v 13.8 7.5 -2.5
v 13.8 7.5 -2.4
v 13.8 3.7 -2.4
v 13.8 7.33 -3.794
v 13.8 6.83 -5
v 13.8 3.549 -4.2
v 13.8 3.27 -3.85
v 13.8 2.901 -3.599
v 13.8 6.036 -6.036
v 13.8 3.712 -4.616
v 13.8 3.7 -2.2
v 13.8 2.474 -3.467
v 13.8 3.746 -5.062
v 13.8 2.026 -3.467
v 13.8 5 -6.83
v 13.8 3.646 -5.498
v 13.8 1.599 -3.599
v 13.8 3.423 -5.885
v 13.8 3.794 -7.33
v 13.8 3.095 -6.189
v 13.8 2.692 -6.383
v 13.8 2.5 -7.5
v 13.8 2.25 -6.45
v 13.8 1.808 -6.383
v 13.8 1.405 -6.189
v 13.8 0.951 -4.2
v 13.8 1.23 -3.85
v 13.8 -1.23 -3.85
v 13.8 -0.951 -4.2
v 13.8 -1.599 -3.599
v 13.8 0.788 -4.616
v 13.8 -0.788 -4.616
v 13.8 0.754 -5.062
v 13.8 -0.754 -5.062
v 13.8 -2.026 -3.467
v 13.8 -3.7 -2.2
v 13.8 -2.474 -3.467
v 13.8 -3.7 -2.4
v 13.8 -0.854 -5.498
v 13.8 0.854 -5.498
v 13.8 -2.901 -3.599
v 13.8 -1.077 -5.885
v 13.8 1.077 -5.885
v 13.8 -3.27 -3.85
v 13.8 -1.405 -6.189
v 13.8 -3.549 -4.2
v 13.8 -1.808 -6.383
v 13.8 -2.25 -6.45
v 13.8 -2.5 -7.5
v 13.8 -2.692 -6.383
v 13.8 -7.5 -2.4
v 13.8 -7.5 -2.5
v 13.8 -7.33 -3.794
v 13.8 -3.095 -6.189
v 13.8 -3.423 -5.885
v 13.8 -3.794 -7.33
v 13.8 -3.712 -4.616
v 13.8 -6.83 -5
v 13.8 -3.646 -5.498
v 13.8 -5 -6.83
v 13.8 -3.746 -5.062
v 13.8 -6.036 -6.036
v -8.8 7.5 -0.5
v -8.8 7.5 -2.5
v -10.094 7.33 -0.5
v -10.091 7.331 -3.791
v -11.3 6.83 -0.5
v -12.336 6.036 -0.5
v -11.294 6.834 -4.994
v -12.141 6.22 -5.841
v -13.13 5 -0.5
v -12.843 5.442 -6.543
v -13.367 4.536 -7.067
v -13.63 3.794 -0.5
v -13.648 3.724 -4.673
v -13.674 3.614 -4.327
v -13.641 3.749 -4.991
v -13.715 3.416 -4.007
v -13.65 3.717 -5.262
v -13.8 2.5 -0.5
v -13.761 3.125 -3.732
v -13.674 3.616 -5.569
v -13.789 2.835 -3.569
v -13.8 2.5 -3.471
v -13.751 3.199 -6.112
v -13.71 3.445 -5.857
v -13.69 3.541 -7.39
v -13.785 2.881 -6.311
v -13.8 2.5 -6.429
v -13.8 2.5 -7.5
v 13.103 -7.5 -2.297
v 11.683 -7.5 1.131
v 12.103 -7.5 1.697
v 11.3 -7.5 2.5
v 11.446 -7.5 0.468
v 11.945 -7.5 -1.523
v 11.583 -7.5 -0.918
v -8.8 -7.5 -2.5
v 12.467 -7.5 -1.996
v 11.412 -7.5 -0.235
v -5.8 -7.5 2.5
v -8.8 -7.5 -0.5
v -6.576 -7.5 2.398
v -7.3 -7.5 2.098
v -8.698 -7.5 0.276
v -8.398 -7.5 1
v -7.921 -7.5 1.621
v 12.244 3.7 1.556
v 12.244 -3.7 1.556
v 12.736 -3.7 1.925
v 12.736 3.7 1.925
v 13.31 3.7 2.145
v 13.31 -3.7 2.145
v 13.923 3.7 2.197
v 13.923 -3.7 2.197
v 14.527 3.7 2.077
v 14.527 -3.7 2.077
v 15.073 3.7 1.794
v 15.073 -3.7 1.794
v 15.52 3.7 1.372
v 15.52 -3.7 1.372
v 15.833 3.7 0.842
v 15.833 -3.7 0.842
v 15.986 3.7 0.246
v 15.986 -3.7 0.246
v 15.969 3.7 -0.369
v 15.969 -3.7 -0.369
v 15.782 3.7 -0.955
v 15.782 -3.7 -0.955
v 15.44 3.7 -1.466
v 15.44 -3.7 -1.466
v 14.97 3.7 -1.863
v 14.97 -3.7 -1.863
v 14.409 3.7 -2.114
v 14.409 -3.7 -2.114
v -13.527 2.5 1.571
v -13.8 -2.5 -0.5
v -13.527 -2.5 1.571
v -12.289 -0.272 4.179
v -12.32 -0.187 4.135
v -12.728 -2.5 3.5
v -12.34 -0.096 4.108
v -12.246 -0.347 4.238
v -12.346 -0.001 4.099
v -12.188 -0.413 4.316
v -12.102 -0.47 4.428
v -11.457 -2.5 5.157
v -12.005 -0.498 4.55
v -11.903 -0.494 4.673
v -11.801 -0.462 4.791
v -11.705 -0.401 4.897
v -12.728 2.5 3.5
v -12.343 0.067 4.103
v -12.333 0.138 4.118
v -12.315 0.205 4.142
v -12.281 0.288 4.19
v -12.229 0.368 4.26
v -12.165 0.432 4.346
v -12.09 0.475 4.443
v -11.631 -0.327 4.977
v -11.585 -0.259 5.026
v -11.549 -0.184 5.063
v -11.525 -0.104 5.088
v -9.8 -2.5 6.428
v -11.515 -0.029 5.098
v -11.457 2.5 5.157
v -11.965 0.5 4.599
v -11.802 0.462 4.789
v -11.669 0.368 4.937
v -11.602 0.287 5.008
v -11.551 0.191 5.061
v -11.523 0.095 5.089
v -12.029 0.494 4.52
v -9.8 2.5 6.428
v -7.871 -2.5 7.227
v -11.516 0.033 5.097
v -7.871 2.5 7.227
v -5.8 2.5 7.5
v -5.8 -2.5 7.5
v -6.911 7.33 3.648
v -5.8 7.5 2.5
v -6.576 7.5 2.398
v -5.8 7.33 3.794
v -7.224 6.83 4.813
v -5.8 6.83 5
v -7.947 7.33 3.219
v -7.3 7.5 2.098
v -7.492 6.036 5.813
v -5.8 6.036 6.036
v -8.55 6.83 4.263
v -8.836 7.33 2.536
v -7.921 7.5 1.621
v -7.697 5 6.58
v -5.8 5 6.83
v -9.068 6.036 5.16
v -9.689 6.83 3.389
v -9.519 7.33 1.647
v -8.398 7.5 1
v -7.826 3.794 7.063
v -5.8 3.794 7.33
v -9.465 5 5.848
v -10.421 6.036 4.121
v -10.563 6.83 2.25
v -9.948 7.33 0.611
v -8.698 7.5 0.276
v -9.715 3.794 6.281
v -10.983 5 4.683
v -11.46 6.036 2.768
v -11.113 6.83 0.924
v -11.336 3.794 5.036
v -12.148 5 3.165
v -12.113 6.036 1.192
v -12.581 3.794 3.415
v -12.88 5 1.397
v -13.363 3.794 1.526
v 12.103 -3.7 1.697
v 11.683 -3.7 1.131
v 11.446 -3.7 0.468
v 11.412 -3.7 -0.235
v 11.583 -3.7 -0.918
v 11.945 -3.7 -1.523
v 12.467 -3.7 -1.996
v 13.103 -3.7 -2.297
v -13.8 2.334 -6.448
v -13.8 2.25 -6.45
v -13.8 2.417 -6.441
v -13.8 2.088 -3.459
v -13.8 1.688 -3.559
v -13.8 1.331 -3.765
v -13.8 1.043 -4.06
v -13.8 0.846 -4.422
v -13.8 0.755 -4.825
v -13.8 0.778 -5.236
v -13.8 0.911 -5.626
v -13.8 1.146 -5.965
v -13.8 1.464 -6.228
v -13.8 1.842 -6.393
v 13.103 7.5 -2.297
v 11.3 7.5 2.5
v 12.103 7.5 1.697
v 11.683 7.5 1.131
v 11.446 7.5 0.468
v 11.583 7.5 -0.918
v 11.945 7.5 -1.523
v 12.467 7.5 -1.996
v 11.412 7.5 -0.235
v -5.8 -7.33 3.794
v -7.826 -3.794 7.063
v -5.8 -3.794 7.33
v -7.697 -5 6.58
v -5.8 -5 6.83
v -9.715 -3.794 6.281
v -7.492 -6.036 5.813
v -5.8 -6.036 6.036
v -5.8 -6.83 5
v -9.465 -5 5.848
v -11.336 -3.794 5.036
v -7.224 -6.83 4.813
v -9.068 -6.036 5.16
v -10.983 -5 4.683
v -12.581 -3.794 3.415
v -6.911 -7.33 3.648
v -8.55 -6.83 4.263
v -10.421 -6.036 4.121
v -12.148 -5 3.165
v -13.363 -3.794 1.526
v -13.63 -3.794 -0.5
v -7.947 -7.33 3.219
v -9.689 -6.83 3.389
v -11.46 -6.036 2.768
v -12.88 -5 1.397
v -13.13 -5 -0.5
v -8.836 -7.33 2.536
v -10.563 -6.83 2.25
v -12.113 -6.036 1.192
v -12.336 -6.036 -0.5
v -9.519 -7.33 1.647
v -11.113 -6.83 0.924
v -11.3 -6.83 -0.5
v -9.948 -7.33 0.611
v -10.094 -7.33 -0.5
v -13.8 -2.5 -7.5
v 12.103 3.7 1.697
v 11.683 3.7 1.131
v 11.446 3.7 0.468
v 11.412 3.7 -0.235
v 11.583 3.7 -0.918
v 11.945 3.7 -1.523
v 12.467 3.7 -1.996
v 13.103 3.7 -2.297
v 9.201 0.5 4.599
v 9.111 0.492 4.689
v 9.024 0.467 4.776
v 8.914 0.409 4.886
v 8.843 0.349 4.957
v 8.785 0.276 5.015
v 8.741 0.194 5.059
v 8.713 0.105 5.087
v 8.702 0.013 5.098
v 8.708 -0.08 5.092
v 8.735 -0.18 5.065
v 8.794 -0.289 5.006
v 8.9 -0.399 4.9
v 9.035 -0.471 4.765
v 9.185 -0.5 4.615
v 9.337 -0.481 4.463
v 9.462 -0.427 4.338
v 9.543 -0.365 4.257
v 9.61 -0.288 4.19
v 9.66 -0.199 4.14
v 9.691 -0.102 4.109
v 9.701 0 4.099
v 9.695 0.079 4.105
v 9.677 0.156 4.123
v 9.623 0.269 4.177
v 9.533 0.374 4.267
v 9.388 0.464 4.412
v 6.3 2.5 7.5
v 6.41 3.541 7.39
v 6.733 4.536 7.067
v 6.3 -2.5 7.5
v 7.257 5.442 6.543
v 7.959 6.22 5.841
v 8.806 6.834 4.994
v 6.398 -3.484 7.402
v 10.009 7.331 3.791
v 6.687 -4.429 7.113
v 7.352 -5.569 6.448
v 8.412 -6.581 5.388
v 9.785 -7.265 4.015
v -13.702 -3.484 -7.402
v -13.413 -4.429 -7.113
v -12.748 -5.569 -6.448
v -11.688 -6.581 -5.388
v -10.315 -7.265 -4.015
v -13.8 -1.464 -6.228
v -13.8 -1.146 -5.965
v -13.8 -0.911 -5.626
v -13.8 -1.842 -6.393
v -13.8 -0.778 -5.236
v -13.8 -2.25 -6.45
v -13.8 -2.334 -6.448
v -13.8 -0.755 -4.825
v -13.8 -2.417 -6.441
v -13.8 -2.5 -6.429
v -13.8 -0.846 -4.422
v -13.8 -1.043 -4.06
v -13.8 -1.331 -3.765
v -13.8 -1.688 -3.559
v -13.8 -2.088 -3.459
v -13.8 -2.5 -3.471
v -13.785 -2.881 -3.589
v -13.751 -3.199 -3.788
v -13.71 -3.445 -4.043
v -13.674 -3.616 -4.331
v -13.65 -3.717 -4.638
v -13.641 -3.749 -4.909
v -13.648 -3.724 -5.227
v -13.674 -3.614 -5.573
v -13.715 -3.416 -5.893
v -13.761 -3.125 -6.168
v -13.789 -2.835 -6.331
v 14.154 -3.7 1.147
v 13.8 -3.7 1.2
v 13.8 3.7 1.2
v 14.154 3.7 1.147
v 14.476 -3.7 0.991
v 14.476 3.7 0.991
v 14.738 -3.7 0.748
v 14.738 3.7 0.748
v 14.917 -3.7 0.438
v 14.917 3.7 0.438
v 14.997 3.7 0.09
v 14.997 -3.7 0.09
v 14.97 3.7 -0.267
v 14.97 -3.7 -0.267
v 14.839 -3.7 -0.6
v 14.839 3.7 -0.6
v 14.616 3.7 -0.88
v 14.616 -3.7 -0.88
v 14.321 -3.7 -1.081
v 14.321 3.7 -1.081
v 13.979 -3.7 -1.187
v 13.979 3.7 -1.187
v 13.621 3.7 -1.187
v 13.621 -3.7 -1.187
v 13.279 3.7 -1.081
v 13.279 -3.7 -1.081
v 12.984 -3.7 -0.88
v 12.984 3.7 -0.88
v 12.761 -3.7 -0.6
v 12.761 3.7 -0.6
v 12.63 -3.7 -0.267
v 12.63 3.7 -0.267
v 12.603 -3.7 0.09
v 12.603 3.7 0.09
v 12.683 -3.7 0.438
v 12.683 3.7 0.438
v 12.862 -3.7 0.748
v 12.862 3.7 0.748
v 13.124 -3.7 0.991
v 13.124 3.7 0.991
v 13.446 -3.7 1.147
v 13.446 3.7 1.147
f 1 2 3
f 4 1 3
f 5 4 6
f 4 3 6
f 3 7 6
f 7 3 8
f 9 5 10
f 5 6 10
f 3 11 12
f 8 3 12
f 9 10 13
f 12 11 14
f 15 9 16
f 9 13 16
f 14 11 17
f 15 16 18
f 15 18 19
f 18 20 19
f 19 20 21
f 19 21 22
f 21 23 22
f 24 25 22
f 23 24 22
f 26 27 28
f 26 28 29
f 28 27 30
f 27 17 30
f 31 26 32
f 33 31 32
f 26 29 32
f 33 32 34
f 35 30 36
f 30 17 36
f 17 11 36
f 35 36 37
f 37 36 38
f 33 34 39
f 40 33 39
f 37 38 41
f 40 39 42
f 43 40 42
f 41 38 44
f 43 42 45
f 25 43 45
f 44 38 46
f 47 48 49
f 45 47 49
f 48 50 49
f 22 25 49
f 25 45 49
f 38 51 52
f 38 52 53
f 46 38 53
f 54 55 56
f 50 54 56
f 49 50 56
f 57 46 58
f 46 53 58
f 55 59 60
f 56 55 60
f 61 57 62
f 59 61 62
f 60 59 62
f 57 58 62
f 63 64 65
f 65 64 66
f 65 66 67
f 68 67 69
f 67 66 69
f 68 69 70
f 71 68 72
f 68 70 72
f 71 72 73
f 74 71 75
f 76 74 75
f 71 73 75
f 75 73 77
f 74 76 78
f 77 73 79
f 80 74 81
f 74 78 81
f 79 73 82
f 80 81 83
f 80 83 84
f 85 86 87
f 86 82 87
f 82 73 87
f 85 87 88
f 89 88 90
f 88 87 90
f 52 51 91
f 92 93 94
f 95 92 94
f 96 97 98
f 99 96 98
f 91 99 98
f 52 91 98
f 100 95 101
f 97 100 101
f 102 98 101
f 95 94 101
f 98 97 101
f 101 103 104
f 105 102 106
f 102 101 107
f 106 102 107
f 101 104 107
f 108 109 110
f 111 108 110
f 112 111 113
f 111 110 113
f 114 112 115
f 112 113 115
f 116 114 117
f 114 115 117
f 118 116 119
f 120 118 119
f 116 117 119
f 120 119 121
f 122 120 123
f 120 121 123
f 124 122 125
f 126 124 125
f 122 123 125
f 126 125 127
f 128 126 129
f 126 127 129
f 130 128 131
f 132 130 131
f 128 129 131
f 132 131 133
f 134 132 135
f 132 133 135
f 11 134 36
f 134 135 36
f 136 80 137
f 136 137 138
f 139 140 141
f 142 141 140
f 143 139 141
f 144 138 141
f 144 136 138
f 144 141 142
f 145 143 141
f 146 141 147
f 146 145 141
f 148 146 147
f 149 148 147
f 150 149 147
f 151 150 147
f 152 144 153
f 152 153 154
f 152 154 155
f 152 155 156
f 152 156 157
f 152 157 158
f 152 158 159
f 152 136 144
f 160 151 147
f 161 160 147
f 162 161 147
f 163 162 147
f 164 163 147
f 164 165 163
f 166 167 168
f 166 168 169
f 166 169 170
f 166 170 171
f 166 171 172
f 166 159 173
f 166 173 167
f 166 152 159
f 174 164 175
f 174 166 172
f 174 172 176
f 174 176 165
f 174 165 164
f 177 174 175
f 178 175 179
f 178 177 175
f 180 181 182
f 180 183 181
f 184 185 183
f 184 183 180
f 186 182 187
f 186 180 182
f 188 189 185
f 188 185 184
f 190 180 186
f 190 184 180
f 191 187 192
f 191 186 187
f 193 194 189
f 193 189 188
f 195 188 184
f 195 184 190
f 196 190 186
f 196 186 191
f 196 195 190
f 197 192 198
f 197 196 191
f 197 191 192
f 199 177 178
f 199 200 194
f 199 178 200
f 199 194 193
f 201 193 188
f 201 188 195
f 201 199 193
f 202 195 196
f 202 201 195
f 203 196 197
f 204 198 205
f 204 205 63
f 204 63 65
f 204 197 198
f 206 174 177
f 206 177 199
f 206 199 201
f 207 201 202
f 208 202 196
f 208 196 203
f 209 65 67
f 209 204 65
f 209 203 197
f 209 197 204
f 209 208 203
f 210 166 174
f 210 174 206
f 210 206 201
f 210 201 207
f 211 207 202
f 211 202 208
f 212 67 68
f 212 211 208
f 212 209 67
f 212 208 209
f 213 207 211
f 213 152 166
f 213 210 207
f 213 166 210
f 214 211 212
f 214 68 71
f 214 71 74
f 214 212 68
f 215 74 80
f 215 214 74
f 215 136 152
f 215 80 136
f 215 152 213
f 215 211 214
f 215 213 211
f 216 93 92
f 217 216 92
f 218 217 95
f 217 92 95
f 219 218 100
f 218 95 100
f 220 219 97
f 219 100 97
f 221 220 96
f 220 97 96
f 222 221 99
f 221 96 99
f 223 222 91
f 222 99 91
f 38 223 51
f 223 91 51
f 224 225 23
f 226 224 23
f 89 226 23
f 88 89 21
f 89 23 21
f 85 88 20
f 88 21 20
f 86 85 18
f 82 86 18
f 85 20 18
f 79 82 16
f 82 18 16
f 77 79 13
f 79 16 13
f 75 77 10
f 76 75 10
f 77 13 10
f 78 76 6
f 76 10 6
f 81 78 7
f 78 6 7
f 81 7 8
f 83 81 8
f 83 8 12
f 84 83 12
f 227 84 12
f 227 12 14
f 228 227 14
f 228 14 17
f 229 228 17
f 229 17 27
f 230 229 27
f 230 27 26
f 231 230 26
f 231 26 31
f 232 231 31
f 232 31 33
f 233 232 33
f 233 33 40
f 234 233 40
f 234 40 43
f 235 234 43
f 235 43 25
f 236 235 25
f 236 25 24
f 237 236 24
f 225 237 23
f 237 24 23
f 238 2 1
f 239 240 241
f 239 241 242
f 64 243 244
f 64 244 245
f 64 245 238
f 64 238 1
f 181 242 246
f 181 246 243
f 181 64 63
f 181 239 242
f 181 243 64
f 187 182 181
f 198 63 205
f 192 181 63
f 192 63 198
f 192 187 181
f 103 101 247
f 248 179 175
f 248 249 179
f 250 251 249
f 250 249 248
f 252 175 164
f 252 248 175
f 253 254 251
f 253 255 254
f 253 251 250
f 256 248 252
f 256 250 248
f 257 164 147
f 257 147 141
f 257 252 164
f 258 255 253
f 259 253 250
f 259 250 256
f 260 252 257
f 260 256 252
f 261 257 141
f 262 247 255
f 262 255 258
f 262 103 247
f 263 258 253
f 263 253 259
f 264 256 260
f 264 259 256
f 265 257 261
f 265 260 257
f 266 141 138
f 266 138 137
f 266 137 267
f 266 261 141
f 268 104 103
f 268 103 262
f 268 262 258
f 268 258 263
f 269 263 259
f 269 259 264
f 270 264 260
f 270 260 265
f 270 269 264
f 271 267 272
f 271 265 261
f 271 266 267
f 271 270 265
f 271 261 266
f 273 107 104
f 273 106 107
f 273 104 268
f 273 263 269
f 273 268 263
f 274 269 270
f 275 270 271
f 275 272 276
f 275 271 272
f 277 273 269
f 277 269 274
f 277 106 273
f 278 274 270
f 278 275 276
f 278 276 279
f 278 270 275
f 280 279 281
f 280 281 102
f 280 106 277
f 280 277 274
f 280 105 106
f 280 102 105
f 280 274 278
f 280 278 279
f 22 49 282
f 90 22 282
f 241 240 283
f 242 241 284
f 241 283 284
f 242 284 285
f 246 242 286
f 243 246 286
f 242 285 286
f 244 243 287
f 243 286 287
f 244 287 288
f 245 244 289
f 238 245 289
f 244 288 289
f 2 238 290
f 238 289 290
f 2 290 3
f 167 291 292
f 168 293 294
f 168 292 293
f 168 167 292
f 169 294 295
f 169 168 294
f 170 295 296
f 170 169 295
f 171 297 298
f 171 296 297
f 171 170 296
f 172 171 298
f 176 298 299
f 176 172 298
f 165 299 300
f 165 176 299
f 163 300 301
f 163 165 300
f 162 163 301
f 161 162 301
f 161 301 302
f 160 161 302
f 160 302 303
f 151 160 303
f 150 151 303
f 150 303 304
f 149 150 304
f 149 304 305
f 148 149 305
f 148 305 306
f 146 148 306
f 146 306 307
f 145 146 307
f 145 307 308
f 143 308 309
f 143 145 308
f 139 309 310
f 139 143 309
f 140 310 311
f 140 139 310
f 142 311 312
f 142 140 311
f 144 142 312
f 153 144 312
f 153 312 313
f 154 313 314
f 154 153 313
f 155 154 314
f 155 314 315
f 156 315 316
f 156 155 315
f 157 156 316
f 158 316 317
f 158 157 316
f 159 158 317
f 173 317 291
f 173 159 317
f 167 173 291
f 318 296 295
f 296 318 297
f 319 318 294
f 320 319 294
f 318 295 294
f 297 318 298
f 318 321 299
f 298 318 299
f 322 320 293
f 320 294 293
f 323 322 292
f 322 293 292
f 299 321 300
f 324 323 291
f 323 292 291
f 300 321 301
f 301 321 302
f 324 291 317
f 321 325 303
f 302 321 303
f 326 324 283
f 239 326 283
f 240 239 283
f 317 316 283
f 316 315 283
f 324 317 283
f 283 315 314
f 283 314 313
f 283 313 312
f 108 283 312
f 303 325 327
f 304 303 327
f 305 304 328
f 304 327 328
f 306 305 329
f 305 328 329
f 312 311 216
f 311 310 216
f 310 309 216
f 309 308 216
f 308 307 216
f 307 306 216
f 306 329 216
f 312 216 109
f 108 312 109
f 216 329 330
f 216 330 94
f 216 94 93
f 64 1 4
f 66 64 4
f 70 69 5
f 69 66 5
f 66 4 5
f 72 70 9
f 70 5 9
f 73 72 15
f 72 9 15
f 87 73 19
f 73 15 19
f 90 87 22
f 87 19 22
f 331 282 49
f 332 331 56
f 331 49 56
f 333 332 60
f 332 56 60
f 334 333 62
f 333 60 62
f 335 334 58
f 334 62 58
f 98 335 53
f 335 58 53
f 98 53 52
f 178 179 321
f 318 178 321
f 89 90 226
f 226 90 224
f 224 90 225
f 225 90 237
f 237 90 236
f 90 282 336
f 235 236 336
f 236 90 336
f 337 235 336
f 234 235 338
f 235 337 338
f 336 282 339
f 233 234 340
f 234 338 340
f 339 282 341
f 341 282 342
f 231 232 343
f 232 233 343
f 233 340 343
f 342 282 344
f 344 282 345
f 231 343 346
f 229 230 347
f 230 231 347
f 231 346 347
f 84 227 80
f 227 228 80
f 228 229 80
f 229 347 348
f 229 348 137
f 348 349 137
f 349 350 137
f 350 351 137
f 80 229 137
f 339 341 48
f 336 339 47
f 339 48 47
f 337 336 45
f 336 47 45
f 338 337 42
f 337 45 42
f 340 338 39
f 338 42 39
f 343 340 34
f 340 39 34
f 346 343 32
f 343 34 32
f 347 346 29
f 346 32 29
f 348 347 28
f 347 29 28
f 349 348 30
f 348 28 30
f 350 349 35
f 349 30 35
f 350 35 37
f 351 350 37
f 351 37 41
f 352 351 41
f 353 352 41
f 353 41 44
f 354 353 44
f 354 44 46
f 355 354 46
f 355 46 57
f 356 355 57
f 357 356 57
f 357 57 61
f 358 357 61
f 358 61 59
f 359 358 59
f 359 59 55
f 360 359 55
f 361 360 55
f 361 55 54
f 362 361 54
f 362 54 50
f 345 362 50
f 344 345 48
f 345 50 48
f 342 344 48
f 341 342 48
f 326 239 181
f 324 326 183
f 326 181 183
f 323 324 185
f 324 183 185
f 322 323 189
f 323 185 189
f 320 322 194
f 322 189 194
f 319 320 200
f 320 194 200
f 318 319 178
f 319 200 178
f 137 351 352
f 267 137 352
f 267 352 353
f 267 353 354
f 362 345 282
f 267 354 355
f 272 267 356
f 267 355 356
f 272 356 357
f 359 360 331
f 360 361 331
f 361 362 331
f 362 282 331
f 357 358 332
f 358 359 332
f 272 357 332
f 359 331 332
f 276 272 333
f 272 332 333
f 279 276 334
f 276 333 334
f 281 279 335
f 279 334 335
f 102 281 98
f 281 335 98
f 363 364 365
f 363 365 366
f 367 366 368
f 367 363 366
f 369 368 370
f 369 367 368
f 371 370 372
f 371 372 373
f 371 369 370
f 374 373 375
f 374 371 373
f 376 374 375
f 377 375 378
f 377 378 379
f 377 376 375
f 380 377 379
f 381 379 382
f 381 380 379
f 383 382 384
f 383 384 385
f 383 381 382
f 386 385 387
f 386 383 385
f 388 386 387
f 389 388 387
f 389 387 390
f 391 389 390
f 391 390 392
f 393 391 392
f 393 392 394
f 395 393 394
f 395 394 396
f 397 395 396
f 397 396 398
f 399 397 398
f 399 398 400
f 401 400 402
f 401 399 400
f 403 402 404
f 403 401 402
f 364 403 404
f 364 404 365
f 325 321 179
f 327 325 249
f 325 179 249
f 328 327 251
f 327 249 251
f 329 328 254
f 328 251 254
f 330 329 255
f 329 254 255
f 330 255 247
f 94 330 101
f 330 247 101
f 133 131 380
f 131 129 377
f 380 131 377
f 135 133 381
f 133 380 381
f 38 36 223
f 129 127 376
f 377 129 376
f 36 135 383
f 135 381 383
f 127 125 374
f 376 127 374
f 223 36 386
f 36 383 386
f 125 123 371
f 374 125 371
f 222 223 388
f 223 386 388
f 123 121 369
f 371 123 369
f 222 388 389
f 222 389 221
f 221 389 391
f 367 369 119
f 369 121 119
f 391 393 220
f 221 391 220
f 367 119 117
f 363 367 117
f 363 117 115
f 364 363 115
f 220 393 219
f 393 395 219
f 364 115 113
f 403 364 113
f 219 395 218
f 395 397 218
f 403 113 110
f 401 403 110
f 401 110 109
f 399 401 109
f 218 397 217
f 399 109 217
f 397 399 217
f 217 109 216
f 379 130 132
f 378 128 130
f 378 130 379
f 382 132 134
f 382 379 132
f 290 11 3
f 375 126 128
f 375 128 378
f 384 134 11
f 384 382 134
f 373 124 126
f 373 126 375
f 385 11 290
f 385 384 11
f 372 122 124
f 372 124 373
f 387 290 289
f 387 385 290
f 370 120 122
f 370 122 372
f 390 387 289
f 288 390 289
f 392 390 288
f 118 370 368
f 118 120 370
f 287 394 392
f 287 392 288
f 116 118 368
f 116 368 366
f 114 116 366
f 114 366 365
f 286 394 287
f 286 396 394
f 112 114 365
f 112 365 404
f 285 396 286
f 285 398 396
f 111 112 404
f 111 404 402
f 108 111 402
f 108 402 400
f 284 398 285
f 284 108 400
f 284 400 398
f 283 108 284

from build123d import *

# Parameters (mm, degrees)
BOSS_EXTRUDE1_DEPTH      = 7.5
BOSS_EXTRUDE1_DEPTH_BACK = 7.5
CUT_EXTRUDE3_REACH       = 31.568
SKETCH5_R                = 1.5
BOSS_EXTRUDE2_DEPTH      = 3.7
BOSS_EXTRUDE2_DEPTH_BACK = 3.7
SKETCH6_R                = 1.2
FILLET1_R                = 8
FILLET2_R                = 5
CUT_EXTRUDE4_START       = -12.346261552
CUT_EXTRUDE4_OUTLINE_R   = 0.5
CUT_EXTRUDE4_DEPTH       = 22.047733515


# Read off the part's stored shape, not the designer's step: Cut-Extrude4
with BuildPart() as part:
    # Sketch1 → Boss-Extrude1 (new, two sides: drawn at the far end of the back side and taken through both)
    with BuildSketch(Plane(origin=(0, 0, 0), x_dir=(-1, 0, 0), z_dir=(0, 1, 0)).offset(-BOSS_EXTRUDE1_DEPTH_BACK)):
        with BuildLine():
            Line((-13.8, -7.5), (13.8, -7.5))
            Line((13.8, -7.5), (13.8, 7.5))
            Line((13.8, 7.5), (-6.3, 7.5))
            Line((-6.3, 7.5), (-12.102943725, 1.697056275))
            ThreePointArc((-12.102943725, 1.697056275), (-11.582689122, -0.918440238), (-13.8, -2.4))
            Line((-13.8, -2.4), (-13.8, -7.5))
        make_face()
    extrude(amount=BOSS_EXTRUDE1_DEPTH + BOSS_EXTRUDE1_DEPTH_BACK)

    # Sketch5 → Cut-Extrude3 (cut, up to next)
    with BuildSketch(Plane.YZ.offset(13.8), mode=Mode.PRIVATE) as cut_extrude3_sk1:
        with Locations(Location((-2.25, -4.95, 0), (0, 0, 270))):
            Circle(SKETCH5_R)
    cut_extrude3_tool1 = extrude(cut_extrude3_sk1.sketch, amount=-CUT_EXTRUDE3_REACH, mode=Mode.PRIVATE) & part.part
    # Sketch5 → Cut-Extrude3 (cut, up to next)
    with BuildSketch(Plane.YZ.offset(13.8), mode=Mode.PRIVATE) as cut_extrude3_sk2:
        with Locations(Location((2.25, -4.95, 0), (0, 0, 270))):
            Circle(SKETCH5_R)
    cut_extrude3_tool2 = extrude(cut_extrude3_sk2.sketch, amount=-CUT_EXTRUDE3_REACH, mode=Mode.PRIVATE) & part.part
    add(cut_extrude3_tool1.solids().sort_by_distance((13.8, -2.25, -4.95))[0], mode=Mode.SUBTRACT)
    add(cut_extrude3_tool2.solids().sort_by_distance((13.8, 2.25, -4.95))[0], mode=Mode.SUBTRACT)

    # Sketch6 → Boss-Extrude2 (add, two sides: drawn at the far end of the back side and taken through both)
    with BuildSketch(Plane(origin=(0, 0, 0), x_dir=(-1, 0, 0), z_dir=(0, 1, 0)).offset(-BOSS_EXTRUDE2_DEPTH_BACK)):
        with BuildLine():
            Line((-12.102943725, 1.697056275), (-12.244365081, 1.555634919))
            ThreePointArc((-12.244365081, 1.555634919), (-15.832534972, 0.841903551), (-13.8, -2.2))
            Line((-13.8, -2.2), (-13.8, -2.4))
            ThreePointArc((-13.8, -2.4), (-11.582689122, -0.918440238), (-12.102943725, 1.697056275))
        make_face()
        with Locations(Location((-13.8, 0, 0), (0, 0, 90))):
            Circle(SKETCH6_R, mode=Mode.SUBTRACT)
    extrude(amount=BOSS_EXTRUDE2_DEPTH + BOSS_EXTRUDE2_DEPTH_BACK)

    # Fillet1
    fillet1_edges = [part.edges().sort_by_distance(p)[0] for p in [
        (-13.8, 0, 7.5),
    ]]
    fillet(fillet1_edges, radius=FILLET1_R)

    # Fillet2
    # the kernel refuses this fillet: 5 mm, written as the material it takes off along each edge
    with BuildSketch(Plane(origin=(26.3, -7.5, -7.5), x_dir=(0, 1, 0), z_dir=(-1, 0, 0)), Plane(origin=(26.3, 7.5, -7.5), x_dir=(0, 0, 1), z_dir=(-1, 0, 0))) as fillet2_piece_1:
        with BuildLine():
            CenterArc((FILLET2_R, -FILLET2_R), FILLET2_R, 90, 90)
            Line((0, -FILLET2_R), (0, 0))
            Line((0, 0), (FILLET2_R, 0))
        make_face()
    extrude(amount=52.6, mode=Mode.SUBTRACT)
    with BuildSketch(Plane(origin=(-5.8, 7.5, 7.5), x_dir=(0, 0, -1), z_dir=(1, 0, 0)), Plane(origin=(-5.8, -7.5, 7.5), x_dir=(0, 1, 0), z_dir=(1, 0, 0))) as fillet2_piece_2:
        with BuildLine():
            CenterArc((FILLET2_R, -FILLET2_R), FILLET2_R, 90, 90)
            Line((0, -FILLET2_R), (0, 0))
            Line((0, 0), (FILLET2_R, 0))
        make_face()
    extrude(amount=24.6, mode=Mode.SUBTRACT)
    with BuildSketch(Plane(origin=(-13.8, 7.5, -20), x_dir=(1, 0, 0), z_dir=(0, 0, 1)), Plane(origin=(-13.8, -7.5, -20), x_dir=(0, 1, 0), z_dir=(0, 0, 1))) as fillet2_piece_3:
        with BuildLine():
            CenterArc((FILLET2_R, -FILLET2_R), FILLET2_R, 90, 90)
            Line((0, -FILLET2_R), (0, 0))
            Line((0, 0), (FILLET2_R, 0))
        make_face()
    extrude(amount=19.5, mode=Mode.SUBTRACT)
    with BuildSketch(Plane(origin=(-5.8, 7.5, -0.5), x_dir=(0, 0, 1), z_dir=(1, 0, 0))) as fillet2_piece_4:
        with BuildLine():
            CenterArc((8 - FILLET2_R, FILLET2_R), FILLET2_R, 270, 90)
            Line((8, FILLET2_R), (8, 0))
            Line((8, 0), (8 - FILLET2_R, 0))
        make_face()
    revolve(axis=Axis((-5.8, 7.5, -0.5), (0, -1, 0)), revolution_arc=90, mode=Mode.SUBTRACT)
    with BuildSketch(Plane(origin=(-5.8, -7.5, -0.5), x_dir=(0, 0, 1), z_dir=(1, 0, 0))) as fillet2_piece_5:
        with BuildLine():
            CenterArc((8 - FILLET2_R, -FILLET2_R), FILLET2_R, 0, 90)
            Line((8 - FILLET2_R, 0), (8, 0))
            Line((8, 0), (8, -FILLET2_R))
        make_face()
    revolve(axis=Axis((-5.8, -7.5, -0.5), (0, -1, 0)), revolution_arc=90, mode=Mode.SUBTRACT)

    # Cut-Extrude4 outline → Cut-Extrude4 (cut)
    with BuildSketch(Plane.YZ.offset(CUT_EXTRUDE4_START)):
        with Locations((0, 4.598528137)):
            Circle(CUT_EXTRUDE4_OUTLINE_R)
    extrude(amount=CUT_EXTRUDE4_DEPTH, mode=Mode.SUBTRACT)


solid = part.part
